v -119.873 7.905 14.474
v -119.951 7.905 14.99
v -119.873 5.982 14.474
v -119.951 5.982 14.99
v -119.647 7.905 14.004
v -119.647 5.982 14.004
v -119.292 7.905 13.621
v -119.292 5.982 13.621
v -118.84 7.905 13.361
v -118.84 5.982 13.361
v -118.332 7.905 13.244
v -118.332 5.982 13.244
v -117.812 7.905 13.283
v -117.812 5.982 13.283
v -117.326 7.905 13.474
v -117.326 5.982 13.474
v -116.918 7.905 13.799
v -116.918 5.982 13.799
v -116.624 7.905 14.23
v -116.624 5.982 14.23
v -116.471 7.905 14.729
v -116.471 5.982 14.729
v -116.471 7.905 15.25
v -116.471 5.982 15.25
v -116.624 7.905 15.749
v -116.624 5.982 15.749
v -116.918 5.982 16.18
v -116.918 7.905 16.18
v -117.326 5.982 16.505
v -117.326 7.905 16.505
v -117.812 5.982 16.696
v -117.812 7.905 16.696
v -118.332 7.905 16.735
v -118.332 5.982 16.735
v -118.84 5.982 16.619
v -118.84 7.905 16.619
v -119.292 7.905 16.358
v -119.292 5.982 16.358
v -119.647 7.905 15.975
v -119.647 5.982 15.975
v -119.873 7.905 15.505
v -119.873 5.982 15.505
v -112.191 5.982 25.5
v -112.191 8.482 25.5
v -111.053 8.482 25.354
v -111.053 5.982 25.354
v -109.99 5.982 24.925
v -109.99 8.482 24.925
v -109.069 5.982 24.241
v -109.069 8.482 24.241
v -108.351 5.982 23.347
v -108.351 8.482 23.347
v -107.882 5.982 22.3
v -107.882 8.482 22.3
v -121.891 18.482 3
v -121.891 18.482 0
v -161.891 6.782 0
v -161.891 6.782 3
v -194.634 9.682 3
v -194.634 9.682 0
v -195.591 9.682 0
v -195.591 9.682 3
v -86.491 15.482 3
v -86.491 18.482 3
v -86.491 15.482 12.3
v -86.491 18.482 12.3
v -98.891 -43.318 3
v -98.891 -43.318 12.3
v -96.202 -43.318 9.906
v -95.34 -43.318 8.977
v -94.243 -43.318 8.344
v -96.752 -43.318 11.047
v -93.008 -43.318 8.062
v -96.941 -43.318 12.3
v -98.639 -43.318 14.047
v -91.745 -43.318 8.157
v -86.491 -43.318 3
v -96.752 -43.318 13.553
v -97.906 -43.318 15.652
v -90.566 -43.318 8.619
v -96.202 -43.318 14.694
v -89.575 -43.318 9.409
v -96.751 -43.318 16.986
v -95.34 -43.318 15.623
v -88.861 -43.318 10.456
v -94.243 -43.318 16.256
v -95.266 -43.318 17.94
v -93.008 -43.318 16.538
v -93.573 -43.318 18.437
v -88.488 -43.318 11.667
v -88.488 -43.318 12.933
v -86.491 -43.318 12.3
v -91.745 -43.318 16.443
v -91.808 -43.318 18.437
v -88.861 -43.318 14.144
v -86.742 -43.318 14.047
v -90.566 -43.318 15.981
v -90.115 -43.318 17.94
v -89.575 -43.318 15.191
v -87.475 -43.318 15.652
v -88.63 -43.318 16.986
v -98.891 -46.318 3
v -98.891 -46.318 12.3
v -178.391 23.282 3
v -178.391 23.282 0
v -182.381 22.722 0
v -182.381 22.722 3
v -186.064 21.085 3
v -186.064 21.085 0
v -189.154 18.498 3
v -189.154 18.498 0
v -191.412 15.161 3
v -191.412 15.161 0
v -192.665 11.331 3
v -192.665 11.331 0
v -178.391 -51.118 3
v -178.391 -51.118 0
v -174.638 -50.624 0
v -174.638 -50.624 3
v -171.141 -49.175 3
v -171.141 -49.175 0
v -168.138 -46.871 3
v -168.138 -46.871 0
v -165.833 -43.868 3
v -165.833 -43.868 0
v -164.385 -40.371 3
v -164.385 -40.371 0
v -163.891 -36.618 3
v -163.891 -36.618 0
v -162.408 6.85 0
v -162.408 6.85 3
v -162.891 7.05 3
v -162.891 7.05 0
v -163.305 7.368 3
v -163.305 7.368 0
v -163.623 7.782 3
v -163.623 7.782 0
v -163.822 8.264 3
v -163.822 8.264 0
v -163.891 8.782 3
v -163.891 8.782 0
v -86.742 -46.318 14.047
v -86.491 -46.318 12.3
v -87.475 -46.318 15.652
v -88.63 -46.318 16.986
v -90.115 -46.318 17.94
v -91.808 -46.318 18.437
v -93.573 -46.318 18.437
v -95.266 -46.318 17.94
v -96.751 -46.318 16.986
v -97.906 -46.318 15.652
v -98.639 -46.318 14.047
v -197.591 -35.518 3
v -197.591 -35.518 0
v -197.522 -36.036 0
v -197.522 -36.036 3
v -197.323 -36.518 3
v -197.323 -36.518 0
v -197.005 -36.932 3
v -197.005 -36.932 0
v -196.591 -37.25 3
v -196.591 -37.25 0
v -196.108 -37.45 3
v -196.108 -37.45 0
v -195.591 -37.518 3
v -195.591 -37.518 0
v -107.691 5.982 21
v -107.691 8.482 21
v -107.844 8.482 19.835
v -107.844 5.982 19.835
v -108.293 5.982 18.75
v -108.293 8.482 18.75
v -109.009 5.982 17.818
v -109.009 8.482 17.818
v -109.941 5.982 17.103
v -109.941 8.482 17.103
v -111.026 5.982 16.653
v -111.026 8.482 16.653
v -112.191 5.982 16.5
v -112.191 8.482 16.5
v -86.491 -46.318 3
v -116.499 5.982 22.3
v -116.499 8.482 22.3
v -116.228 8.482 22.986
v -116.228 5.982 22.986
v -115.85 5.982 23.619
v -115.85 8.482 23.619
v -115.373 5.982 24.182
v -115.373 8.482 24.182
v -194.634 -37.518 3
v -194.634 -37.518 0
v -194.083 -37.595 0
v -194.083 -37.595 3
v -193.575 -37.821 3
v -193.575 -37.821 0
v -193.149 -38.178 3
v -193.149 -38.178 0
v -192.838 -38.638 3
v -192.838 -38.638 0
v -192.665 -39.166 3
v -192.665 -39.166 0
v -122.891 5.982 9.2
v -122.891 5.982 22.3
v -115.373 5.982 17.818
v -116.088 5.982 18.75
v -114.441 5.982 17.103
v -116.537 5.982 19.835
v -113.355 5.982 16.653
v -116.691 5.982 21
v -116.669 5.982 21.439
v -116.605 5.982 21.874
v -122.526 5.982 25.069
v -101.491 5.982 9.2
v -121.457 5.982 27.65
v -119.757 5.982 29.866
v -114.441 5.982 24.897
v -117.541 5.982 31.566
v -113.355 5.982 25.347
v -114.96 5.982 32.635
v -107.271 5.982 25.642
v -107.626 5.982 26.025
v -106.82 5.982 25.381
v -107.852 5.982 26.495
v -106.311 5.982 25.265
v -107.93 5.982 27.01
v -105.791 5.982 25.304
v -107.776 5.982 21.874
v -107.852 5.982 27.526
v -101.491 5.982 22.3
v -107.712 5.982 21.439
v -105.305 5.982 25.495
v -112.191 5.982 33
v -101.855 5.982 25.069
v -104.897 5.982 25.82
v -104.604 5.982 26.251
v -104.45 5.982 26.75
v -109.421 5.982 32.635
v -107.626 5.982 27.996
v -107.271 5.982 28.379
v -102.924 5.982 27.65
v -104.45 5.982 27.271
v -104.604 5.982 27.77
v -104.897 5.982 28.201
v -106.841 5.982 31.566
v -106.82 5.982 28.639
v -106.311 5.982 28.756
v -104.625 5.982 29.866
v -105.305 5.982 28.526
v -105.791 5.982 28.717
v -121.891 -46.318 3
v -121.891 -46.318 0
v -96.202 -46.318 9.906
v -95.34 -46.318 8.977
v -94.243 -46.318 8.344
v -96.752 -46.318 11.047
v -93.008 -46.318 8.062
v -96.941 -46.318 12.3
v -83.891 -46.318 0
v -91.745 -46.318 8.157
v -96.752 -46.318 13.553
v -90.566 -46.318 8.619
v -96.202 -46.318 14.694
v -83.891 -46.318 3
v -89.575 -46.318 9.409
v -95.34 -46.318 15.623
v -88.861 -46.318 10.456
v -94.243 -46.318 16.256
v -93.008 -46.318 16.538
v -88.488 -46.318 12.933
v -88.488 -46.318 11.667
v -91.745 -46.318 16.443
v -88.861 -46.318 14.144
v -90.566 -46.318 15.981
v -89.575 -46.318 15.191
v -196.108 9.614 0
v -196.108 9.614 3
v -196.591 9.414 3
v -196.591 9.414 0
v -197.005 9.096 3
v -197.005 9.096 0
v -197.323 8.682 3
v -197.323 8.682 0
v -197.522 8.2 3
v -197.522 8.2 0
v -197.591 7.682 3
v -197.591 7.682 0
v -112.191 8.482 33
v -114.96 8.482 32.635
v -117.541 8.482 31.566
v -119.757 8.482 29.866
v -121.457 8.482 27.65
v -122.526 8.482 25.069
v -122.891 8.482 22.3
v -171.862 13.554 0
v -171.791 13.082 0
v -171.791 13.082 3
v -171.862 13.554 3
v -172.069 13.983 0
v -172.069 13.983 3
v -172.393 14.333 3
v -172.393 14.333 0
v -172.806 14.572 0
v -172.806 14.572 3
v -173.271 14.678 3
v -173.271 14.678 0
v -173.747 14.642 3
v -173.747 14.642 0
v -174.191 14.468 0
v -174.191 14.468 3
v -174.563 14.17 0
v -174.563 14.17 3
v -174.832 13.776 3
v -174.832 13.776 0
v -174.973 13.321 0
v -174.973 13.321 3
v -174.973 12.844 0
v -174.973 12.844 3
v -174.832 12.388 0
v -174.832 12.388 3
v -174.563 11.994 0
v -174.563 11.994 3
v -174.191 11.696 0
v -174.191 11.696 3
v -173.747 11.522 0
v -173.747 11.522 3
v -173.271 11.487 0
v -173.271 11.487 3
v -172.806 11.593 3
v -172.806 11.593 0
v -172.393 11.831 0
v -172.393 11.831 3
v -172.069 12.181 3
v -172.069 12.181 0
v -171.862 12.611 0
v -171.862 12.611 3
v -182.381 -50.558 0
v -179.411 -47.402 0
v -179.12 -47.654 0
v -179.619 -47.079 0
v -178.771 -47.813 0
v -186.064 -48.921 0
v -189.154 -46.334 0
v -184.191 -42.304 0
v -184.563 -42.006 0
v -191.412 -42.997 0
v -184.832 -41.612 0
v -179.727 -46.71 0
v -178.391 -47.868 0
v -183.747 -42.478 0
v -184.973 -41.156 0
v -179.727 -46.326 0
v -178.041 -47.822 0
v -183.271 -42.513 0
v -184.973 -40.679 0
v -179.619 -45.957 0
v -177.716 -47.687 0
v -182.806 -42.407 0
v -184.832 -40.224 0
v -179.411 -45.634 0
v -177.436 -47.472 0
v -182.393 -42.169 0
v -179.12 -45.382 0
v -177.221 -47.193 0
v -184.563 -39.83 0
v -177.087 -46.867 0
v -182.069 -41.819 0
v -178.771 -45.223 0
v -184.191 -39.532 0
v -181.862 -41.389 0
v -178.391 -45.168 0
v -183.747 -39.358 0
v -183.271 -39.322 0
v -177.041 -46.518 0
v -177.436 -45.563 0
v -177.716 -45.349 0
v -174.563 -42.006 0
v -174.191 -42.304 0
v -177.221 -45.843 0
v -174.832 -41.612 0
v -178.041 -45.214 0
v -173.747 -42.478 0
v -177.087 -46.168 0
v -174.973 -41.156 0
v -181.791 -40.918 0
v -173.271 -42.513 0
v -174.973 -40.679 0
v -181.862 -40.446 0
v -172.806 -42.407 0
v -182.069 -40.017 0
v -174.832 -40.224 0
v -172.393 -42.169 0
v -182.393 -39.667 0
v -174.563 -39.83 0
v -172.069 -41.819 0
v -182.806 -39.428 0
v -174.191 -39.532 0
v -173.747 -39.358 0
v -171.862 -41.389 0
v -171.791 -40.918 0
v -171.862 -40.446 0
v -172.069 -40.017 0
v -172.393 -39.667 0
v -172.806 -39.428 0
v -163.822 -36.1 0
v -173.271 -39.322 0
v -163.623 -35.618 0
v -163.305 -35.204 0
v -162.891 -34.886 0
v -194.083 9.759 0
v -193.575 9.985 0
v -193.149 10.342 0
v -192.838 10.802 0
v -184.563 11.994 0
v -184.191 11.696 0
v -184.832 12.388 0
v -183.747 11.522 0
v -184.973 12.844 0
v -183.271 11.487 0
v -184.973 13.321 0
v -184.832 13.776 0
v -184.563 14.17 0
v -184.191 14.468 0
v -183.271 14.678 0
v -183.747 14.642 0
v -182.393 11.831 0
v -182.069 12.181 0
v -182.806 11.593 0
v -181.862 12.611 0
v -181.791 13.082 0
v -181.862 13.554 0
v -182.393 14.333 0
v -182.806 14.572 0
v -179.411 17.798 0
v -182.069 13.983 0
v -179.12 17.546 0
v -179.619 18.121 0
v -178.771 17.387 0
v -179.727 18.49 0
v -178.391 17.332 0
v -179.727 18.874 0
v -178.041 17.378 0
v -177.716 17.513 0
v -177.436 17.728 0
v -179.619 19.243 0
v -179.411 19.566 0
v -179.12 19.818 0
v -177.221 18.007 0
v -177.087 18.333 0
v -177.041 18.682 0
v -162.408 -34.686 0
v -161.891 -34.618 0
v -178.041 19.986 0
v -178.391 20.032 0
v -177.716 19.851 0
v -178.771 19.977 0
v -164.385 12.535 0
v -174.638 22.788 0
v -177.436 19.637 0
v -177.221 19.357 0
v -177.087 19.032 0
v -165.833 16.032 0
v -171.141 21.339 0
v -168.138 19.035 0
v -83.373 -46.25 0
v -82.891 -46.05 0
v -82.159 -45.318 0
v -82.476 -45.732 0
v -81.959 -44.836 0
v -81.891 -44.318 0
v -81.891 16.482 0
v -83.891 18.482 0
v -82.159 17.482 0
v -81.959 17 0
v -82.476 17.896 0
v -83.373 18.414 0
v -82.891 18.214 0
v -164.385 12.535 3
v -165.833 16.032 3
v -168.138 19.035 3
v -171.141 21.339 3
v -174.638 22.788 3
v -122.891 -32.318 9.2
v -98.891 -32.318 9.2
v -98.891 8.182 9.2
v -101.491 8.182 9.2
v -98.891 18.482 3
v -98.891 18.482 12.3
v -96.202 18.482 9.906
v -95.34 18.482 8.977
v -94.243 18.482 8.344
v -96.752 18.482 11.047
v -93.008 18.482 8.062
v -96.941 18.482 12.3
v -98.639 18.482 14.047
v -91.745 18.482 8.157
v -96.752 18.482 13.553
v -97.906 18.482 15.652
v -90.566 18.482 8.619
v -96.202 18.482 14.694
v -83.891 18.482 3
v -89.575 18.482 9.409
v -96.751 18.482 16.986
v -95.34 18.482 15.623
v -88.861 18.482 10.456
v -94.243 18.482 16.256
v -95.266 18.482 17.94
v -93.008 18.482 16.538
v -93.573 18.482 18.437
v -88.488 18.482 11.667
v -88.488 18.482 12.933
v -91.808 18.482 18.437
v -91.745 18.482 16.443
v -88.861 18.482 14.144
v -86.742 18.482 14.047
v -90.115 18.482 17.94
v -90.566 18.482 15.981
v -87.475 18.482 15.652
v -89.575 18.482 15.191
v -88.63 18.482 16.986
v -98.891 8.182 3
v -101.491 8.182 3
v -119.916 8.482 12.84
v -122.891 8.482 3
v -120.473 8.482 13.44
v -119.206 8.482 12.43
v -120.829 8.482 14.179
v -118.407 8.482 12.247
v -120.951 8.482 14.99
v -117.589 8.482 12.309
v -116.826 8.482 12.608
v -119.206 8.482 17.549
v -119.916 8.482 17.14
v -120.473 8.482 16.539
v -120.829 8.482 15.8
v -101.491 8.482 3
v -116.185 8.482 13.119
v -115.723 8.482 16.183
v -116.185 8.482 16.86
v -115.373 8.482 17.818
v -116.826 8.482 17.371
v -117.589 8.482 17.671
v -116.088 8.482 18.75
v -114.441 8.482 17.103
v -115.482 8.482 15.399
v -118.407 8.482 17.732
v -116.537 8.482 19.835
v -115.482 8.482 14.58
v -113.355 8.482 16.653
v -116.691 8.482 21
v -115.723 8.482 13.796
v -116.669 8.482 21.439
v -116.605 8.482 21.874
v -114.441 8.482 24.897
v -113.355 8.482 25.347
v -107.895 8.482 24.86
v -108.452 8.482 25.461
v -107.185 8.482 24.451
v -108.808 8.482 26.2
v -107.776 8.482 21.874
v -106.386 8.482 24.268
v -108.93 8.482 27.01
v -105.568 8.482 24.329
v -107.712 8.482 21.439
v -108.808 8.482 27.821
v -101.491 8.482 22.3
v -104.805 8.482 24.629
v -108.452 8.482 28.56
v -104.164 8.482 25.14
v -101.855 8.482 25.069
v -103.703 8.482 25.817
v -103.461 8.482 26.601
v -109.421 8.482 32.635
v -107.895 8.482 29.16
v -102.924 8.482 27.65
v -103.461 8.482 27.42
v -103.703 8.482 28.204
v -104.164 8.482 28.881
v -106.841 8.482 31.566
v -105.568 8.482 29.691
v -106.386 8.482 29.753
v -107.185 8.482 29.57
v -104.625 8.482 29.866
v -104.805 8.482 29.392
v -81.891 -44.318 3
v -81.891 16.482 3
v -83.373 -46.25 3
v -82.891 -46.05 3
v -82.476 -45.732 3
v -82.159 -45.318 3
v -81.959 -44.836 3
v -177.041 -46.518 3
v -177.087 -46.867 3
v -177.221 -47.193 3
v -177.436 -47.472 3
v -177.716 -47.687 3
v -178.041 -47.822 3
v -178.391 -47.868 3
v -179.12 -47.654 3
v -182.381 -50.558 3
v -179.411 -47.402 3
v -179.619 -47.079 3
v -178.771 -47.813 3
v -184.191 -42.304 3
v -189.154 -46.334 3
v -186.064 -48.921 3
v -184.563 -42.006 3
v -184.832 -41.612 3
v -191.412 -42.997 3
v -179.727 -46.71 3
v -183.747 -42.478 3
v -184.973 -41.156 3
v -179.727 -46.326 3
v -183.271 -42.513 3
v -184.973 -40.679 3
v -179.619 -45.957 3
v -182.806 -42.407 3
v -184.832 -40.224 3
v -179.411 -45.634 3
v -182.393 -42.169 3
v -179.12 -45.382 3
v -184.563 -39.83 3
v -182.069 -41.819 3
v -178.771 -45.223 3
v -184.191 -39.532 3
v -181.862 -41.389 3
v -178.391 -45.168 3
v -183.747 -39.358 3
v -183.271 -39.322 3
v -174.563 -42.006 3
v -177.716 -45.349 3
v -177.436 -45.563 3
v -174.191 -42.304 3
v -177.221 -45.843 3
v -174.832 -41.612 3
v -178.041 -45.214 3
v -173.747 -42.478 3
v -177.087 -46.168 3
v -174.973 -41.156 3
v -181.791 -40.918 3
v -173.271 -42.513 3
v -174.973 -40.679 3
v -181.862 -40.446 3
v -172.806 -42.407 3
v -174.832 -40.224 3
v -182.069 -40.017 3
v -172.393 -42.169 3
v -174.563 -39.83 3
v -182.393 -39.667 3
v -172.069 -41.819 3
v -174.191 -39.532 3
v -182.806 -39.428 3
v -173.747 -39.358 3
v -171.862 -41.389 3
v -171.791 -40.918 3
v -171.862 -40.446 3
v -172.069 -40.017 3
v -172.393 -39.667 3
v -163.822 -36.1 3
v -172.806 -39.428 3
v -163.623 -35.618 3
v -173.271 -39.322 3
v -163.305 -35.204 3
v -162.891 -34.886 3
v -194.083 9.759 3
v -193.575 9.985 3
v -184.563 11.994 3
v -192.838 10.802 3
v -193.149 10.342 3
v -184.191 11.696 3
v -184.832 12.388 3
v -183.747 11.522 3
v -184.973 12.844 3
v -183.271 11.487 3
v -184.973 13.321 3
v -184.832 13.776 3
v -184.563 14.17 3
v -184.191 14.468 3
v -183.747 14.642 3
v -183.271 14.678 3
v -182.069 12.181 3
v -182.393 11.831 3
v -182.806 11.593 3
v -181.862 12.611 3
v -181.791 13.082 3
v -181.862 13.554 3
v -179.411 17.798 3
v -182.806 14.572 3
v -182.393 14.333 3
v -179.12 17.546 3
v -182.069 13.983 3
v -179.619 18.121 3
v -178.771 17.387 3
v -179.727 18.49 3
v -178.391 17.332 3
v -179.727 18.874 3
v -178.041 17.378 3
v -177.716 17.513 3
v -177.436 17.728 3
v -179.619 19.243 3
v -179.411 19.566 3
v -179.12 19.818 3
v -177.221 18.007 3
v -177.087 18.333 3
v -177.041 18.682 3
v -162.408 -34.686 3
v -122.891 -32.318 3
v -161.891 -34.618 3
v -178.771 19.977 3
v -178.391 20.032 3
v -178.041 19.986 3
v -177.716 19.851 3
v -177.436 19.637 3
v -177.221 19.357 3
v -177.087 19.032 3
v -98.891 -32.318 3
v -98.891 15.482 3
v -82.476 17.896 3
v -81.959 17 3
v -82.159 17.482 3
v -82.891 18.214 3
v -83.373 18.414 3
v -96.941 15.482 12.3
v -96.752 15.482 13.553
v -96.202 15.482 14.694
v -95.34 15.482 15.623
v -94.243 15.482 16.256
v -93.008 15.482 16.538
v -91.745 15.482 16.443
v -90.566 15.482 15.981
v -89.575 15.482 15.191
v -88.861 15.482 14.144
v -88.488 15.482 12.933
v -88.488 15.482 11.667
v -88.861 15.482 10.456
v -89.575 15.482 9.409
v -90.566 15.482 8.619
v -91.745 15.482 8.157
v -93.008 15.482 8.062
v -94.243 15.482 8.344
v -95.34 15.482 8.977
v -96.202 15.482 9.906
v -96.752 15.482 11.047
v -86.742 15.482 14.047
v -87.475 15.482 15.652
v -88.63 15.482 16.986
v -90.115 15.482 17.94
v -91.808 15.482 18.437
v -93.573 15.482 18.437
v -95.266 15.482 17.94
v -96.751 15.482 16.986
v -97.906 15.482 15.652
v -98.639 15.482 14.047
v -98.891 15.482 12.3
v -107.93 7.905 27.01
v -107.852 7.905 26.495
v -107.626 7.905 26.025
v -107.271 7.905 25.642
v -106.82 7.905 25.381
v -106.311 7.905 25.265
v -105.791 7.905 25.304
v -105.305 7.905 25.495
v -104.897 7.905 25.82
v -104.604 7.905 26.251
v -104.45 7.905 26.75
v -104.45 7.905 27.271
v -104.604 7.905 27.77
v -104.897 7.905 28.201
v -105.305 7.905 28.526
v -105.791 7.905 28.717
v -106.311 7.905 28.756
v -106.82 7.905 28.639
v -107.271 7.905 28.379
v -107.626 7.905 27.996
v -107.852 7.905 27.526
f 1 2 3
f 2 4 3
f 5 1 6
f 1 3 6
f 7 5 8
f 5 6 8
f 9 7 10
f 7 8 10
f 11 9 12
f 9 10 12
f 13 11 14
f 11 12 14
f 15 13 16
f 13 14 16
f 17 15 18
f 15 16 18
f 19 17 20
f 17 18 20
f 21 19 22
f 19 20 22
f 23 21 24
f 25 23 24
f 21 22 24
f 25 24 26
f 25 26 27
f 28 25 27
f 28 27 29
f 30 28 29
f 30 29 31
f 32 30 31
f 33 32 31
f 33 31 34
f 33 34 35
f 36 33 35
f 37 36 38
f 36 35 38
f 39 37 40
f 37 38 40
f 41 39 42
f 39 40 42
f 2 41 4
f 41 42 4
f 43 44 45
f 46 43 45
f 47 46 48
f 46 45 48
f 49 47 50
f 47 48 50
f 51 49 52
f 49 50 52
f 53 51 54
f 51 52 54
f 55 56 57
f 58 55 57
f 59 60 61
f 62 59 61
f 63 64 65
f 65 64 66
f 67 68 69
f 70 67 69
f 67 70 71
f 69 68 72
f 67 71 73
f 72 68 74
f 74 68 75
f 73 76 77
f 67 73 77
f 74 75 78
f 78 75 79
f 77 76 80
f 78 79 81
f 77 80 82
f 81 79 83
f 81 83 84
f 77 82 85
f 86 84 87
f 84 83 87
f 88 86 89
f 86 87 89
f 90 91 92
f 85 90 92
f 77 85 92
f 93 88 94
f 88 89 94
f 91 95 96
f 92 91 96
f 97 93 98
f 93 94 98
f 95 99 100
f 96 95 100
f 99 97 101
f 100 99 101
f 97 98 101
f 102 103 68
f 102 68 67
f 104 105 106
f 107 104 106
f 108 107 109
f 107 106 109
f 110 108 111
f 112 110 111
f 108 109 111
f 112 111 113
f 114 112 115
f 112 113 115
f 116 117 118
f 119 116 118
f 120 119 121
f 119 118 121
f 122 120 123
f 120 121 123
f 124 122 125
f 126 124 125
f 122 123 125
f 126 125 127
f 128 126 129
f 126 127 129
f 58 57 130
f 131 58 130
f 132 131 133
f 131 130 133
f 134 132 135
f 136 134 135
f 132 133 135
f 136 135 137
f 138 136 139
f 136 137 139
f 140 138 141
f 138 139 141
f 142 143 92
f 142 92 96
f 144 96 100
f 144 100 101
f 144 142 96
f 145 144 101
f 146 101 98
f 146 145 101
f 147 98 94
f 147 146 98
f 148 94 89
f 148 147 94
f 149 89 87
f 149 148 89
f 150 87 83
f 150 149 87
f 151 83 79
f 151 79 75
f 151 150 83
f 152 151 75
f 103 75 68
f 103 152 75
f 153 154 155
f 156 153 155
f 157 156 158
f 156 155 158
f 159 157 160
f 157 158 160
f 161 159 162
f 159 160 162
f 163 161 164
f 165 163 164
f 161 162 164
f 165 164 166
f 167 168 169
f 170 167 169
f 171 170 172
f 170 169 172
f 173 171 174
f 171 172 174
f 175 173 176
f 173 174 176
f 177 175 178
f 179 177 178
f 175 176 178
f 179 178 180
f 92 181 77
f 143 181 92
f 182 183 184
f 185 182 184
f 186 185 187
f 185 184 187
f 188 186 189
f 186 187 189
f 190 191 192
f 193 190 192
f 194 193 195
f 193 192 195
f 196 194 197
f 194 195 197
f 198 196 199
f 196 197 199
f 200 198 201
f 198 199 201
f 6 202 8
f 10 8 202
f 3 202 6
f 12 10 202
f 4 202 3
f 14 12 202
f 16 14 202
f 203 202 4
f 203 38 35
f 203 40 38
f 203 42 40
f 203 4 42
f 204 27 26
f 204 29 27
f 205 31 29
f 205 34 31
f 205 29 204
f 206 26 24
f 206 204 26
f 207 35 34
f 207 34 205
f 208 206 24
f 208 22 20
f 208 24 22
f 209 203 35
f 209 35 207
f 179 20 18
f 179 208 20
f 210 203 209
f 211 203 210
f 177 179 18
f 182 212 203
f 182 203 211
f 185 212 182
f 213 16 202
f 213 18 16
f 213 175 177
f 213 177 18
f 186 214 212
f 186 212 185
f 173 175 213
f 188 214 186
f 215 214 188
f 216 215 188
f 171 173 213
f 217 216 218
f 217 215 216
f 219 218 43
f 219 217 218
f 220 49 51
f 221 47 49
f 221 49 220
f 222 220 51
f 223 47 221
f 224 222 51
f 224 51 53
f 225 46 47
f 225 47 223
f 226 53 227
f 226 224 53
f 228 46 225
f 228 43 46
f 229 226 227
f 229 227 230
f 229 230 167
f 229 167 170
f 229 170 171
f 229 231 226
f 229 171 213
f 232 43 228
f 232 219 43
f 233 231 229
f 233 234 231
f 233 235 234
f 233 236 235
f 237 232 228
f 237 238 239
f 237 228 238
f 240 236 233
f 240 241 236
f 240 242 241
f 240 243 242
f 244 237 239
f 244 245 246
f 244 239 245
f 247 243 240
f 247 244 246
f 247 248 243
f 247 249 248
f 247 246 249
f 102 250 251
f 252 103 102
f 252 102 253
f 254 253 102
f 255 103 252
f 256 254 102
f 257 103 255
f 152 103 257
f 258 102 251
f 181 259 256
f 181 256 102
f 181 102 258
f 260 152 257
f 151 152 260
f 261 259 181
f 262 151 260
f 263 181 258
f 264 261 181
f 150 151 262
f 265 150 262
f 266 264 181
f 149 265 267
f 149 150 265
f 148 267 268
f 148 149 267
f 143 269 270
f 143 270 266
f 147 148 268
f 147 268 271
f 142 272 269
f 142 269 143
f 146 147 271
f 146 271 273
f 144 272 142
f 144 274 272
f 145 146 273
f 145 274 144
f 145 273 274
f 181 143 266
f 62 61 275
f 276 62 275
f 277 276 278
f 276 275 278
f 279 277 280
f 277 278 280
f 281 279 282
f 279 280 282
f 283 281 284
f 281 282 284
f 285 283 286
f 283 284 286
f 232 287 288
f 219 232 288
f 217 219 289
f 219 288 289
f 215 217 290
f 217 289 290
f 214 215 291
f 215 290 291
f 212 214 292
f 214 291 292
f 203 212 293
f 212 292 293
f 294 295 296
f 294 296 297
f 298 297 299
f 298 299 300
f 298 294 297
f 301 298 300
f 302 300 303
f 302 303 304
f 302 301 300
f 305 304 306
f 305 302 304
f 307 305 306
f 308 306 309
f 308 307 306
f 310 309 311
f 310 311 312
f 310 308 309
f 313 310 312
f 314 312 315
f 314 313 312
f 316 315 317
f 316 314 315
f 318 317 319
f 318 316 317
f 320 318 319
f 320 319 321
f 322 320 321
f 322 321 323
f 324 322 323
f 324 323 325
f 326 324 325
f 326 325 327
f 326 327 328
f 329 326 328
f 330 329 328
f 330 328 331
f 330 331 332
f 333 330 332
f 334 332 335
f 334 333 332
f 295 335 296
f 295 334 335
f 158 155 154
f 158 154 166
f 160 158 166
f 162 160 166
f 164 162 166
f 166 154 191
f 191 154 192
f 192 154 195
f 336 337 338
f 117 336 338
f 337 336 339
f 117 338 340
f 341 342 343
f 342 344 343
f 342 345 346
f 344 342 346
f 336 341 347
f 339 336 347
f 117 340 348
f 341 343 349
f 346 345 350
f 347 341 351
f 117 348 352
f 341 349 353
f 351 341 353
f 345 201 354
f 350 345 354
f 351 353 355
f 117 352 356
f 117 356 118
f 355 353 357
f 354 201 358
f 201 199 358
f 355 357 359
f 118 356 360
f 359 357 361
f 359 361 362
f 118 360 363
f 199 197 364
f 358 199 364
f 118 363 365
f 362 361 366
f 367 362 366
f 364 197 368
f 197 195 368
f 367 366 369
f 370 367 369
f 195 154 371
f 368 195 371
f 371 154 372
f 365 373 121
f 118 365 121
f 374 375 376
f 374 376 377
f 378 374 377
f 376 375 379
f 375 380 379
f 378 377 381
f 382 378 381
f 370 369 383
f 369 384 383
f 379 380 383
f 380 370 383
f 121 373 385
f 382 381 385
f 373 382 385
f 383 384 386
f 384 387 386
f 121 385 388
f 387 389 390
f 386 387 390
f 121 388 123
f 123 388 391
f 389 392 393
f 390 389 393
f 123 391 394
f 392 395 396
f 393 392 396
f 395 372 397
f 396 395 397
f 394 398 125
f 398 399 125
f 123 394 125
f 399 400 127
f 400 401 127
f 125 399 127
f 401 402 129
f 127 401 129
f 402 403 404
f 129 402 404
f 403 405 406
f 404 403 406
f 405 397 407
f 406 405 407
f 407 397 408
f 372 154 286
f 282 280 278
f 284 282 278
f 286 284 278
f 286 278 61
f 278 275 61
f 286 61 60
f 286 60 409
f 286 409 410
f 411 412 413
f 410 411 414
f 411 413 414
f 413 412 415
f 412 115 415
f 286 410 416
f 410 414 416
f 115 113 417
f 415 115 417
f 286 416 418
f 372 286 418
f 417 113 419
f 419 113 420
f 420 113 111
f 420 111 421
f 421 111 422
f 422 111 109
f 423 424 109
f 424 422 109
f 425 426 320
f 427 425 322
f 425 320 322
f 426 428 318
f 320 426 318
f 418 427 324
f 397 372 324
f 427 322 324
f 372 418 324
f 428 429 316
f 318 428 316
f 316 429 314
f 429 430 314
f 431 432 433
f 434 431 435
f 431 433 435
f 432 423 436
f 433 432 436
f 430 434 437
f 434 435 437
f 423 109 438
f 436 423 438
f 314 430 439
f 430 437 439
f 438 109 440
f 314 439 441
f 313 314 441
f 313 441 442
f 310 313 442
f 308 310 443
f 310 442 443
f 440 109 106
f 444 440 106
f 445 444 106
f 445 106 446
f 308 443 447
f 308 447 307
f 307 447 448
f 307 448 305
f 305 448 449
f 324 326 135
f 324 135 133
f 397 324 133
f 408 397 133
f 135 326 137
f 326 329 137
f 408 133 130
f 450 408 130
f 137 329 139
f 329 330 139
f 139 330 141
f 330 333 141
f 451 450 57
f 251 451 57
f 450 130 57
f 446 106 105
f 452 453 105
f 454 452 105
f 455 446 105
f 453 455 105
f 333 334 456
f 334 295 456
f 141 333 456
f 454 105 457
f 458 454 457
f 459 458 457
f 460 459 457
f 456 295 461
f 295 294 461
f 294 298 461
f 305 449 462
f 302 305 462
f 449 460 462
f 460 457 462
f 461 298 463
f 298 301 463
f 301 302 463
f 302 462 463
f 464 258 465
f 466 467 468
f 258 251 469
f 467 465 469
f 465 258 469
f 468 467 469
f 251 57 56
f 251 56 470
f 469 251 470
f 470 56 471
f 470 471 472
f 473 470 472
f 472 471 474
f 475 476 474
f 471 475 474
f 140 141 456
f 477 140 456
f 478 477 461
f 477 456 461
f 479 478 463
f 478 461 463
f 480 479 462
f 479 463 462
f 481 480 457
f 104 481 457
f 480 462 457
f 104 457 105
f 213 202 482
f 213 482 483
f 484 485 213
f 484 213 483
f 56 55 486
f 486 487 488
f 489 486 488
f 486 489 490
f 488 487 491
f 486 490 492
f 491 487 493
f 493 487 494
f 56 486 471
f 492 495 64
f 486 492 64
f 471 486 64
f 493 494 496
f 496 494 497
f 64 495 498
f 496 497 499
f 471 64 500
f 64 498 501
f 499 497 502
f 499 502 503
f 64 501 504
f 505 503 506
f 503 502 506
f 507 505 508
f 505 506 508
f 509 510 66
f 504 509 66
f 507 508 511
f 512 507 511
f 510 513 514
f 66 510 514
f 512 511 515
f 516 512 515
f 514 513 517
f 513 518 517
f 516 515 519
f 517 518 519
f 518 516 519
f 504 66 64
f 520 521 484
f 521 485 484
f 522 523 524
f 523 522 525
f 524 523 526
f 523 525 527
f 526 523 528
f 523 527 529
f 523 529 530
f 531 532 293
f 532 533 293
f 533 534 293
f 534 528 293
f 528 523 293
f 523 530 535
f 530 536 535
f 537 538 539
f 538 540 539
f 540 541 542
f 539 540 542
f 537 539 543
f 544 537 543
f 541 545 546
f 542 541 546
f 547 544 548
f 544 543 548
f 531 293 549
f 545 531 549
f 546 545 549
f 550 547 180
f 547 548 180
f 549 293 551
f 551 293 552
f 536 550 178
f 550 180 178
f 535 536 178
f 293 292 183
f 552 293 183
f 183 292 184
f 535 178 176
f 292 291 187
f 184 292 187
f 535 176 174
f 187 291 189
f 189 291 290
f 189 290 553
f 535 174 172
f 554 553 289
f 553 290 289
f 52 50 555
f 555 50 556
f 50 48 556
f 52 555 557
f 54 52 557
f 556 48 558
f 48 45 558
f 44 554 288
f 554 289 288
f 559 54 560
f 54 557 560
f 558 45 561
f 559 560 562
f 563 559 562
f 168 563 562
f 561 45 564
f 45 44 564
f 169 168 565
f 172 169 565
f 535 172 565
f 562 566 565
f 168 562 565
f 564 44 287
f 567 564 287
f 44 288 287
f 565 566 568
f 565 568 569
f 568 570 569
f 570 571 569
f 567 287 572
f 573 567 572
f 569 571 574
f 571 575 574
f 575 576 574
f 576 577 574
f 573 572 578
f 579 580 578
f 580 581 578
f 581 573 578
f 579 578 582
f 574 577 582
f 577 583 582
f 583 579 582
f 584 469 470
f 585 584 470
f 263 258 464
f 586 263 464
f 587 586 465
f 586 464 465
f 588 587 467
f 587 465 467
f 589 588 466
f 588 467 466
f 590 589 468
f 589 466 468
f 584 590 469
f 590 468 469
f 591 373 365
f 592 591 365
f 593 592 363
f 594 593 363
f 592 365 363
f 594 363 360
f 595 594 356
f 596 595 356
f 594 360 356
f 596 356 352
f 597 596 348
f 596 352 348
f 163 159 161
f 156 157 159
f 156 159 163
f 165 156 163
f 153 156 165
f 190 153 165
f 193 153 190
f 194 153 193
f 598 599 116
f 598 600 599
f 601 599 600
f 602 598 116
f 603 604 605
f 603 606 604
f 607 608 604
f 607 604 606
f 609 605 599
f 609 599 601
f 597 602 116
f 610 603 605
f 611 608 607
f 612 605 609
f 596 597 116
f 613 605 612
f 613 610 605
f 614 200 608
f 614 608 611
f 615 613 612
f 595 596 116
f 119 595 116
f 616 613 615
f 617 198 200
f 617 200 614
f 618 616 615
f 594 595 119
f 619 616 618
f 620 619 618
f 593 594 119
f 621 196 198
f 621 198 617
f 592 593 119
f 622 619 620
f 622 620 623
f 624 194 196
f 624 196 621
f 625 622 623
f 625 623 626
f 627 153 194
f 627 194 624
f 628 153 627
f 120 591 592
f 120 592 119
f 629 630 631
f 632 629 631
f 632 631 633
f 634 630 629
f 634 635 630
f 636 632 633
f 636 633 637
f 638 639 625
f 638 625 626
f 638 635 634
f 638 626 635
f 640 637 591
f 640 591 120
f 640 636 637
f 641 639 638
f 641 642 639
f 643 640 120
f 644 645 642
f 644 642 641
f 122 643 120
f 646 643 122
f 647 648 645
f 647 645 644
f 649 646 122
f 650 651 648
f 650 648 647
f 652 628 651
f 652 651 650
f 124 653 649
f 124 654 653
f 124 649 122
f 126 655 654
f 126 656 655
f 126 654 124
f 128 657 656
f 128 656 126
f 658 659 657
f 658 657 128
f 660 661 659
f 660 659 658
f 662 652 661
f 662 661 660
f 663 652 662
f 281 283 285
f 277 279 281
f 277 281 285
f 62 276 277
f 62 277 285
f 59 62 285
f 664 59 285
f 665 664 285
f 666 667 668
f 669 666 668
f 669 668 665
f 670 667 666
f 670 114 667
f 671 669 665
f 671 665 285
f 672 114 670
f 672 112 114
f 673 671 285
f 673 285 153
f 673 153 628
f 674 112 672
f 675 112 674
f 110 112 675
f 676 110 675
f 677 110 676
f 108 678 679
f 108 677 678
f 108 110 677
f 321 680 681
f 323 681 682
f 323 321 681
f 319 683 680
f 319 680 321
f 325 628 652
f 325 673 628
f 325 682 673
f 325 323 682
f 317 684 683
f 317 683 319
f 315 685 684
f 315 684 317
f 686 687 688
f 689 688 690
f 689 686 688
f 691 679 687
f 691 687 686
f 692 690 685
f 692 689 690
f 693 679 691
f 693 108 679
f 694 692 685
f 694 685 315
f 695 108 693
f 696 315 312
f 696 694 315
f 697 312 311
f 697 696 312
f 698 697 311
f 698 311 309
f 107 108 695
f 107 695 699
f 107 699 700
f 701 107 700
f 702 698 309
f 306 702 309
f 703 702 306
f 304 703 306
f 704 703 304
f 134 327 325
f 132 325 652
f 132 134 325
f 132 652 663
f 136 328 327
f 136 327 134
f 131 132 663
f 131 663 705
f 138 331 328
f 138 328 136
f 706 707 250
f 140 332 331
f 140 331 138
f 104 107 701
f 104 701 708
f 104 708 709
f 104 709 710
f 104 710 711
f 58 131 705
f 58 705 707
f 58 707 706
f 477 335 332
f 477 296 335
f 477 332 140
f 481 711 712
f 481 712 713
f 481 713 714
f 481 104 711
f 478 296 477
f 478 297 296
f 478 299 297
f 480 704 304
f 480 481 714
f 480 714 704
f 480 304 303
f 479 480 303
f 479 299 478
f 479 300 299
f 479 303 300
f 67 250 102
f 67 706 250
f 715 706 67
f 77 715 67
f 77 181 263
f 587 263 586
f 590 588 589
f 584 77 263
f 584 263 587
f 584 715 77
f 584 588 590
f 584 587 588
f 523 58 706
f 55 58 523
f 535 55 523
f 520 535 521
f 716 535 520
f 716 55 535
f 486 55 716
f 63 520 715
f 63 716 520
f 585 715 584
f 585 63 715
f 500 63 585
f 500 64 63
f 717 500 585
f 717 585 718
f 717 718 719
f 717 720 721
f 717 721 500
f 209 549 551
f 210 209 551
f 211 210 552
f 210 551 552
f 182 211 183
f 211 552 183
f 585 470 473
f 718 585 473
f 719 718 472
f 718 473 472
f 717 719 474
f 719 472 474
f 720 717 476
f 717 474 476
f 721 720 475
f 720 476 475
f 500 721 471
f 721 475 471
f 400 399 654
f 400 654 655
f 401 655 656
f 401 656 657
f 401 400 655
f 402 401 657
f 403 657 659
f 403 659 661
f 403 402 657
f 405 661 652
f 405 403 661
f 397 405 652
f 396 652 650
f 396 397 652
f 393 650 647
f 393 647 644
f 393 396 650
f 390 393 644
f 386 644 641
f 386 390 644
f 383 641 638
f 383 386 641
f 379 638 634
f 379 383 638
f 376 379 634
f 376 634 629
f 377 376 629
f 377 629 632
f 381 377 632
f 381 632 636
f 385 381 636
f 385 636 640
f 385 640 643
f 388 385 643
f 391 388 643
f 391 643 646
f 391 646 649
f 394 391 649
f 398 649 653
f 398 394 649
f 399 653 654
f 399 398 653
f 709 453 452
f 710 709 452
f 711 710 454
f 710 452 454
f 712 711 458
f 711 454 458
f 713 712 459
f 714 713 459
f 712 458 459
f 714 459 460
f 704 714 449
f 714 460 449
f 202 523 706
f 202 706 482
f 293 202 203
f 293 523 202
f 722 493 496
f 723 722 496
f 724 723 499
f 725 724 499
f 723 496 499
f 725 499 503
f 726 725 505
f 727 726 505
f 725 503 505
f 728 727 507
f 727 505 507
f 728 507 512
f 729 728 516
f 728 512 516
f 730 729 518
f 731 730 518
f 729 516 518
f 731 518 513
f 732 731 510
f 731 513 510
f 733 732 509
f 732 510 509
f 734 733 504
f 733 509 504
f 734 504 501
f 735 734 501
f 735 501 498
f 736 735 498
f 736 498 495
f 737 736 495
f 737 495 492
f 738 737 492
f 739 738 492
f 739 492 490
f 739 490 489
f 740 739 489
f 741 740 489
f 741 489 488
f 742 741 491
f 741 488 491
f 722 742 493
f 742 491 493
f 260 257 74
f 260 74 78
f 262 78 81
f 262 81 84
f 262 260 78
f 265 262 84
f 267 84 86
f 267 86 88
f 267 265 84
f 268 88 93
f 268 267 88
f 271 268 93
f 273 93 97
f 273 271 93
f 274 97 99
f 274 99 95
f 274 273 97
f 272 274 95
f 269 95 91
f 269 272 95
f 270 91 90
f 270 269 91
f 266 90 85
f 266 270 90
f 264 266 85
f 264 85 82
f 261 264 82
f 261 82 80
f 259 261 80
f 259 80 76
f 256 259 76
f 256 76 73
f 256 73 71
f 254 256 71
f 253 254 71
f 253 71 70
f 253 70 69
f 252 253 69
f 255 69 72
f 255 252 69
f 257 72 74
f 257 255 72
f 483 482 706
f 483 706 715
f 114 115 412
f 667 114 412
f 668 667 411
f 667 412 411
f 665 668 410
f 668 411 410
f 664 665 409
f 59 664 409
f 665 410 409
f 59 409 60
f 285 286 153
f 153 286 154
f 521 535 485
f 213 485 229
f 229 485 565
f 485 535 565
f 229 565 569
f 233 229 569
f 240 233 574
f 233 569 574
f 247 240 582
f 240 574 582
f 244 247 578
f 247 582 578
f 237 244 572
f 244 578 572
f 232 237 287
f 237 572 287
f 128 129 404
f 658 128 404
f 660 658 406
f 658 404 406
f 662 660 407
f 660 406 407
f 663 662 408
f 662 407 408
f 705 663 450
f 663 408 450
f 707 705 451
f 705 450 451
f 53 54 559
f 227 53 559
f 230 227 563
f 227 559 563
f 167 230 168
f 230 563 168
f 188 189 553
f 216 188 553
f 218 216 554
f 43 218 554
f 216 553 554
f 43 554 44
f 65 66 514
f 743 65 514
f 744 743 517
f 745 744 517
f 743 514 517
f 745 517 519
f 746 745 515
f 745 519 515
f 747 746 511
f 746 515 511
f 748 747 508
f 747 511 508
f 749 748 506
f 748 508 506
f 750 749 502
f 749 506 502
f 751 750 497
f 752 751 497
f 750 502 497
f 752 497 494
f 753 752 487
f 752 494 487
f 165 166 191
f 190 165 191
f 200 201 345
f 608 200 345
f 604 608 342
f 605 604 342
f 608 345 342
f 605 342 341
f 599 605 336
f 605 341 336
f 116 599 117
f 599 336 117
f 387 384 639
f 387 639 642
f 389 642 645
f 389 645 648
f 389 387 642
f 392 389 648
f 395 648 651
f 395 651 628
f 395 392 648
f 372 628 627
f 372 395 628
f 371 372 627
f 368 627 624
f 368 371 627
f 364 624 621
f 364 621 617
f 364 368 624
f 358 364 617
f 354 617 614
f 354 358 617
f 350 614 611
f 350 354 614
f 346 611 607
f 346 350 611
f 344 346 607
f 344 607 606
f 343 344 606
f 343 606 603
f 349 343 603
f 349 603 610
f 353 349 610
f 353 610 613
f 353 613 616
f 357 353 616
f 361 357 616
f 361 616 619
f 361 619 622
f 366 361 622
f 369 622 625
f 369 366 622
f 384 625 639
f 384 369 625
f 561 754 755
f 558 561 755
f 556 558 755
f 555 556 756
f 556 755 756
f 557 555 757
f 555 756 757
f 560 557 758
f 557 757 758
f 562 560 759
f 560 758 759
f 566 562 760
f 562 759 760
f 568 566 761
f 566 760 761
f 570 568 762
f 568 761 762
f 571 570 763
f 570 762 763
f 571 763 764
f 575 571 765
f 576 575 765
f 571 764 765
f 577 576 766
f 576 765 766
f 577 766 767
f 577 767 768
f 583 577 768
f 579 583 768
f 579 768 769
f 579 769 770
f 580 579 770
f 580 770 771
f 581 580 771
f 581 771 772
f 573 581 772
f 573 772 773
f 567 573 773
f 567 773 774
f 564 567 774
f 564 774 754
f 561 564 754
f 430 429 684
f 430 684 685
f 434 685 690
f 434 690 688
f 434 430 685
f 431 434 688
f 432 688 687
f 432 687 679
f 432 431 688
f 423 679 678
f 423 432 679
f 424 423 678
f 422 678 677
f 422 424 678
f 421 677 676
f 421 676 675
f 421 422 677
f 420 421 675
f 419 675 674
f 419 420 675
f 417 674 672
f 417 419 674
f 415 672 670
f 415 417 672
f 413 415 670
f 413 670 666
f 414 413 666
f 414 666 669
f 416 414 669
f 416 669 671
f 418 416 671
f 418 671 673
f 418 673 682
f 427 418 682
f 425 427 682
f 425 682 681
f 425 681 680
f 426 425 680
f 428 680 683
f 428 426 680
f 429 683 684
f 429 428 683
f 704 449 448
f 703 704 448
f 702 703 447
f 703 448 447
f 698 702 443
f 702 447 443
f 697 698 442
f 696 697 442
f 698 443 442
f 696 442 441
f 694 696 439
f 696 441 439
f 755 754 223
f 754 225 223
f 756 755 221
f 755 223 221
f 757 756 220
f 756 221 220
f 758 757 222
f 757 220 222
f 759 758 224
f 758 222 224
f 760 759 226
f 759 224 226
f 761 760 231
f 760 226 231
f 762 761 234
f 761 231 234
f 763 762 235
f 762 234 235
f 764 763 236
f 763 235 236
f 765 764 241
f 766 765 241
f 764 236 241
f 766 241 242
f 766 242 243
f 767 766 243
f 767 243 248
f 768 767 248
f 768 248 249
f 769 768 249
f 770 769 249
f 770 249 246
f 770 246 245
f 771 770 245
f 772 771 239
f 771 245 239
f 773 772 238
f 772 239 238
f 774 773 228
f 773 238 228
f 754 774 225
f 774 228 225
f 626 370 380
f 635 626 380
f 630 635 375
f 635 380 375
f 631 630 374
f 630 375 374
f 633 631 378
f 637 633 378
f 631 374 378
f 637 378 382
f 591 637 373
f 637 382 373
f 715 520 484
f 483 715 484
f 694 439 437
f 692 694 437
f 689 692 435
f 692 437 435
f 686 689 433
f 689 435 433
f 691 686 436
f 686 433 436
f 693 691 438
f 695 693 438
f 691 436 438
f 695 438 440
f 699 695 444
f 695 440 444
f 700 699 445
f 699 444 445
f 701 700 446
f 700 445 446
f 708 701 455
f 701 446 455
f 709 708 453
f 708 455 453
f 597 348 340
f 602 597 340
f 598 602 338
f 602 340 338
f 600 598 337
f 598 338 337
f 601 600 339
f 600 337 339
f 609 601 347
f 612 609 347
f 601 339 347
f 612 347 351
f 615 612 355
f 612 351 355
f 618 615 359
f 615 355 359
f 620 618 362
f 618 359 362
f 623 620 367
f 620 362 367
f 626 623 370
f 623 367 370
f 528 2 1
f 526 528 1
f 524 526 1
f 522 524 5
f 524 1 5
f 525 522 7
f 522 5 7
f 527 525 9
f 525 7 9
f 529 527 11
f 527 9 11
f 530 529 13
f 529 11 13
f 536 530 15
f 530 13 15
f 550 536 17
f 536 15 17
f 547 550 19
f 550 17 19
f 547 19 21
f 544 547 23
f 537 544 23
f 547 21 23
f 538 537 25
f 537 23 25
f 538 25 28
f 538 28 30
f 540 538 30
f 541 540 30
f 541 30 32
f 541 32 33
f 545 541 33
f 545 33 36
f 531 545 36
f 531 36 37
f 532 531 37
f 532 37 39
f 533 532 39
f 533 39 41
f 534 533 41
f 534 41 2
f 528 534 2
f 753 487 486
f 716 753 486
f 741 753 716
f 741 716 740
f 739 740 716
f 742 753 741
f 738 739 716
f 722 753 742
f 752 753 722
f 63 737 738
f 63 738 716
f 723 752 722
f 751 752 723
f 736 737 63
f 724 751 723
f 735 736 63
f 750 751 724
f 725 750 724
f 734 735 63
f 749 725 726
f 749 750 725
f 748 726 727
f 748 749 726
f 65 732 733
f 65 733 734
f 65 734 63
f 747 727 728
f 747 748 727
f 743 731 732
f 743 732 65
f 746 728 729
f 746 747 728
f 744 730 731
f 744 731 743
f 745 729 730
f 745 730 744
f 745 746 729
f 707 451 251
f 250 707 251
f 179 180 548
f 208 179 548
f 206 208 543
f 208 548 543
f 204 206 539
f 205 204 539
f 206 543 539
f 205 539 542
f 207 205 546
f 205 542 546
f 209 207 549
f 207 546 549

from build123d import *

# Parameters (mm, degrees)
F0_R            = 1.6
F0_W            = 20
F0_H            = 32.4
F1_DEPTH        = 3
F7_DEPTH        = 3
F9_DEPTH        = 3
F11_DEPTH       = 2.5
F12_D           = 3.5
F12_CSINK_D     = 5.5
F12_CSINK_ANGLE = 120
F14_W           = 24
F14_H           = 9.2
F15_DEPTH       = 15.5
F16_DEPTH       = 25


with BuildPart() as f1:
    # F0 (on Top) → F1 (new body)
    with BuildSketch(Plane.XY):
        with BuildLine():
            Line((-197.590603765, 7.6821263526), (-197.590603765, -13.9178736474))
            Line((-197.590603765, -13.9178736474), (-178.390603765, -13.9178736474))
            Line((-178.390603765, -13.9178736474), (-178.390603765, 8.7821263526))
            Line((-178.390603765, 8.7821263526), (-178.390603765, 17.3321263526))
            ThreePointArc((-178.390603765, 17.3321263526), (-179.740603765, 18.6821263526), (-178.390603765, 20.0321263526))
            Line((-178.390603765, 20.0321263526), (-178.390603765, 23.2821263526))
            ThreePointArc((-178.390603765, 23.2821263526), (-187.699120556, 19.8997481824), (-192.6648892104, 11.3306112011))
            ThreePointArc((-192.6648892104, 11.3306112011), (-193.3498228179, 10.1486612726), (-194.6337561684, 9.6821263526))
            Line((-194.6337561684, 9.6821263526), (-195.590603765, 9.6821263526))
            ThreePointArc((-195.590603765, 9.6821263526), (-197.0048173273, 9.096339915), (-197.590603765, 7.6821263526))
        make_face()
        with Locations((-183.390603765, 13.0821263526)):
            Circle(F0_R, mode=Mode.SUBTRACT)
        with BuildLine():
            Line((-178.390603765, -13.9178736474), (-197.590603765, -13.9178736474))
            Line((-197.590603765, -13.9178736474), (-197.590603765, -35.5178736474))
            ThreePointArc((-197.590603765, -35.5178736474), (-197.0048173273, -36.9320872098), (-195.590603765, -37.5178736474))
            Line((-195.590603765, -37.5178736474), (-194.6337561684, -37.5178736474))
            ThreePointArc((-194.6337561684, -37.5178736474), (-193.3498228179, -37.9844085674), (-192.6648892104, -39.1663584959))
            ThreePointArc((-192.6648892104, -39.1663584959), (-187.699120556, -47.7354954773), (-178.390603765, -51.1178736474))
            Line((-178.390603765, -51.1178736474), (-178.390603765, -47.8678736474))
            ThreePointArc((-178.390603765, -47.8678736474), (-179.740603765, -46.5178736474), (-178.390603765, -45.1678736474))
            Line((-178.390603765, -45.1678736474), (-178.390603765, -13.9178736474))
        make_face()
        with Locations((-183.390603765, -40.9178736474)):
            Circle(F0_R, mode=Mode.SUBTRACT)
        with BuildLine():
            Line((-178.390603765, 8.7821263526), (-178.390603765, -13.9178736474))
            Line((-178.390603765, -13.9178736474), (-161.890603765, -13.9178736474))
            Line((-161.890603765, -13.9178736474), (-161.890603765, 6.7821263526))
            ThreePointArc((-161.890603765, 6.7821263526), (-163.3048173273, 7.3679127902), (-163.890603765, 8.7821263526))
            Line((-163.890603765, 8.7821263526), (-178.390603765, 8.7821263526))
        make_face()
        with BuildLine():
            Line((-161.890603765, -13.9178736474), (-178.390603765, -13.9178736474))
            Line((-178.390603765, -13.9178736474), (-178.390603765, -45.1678736474))
            ThreePointArc((-178.390603765, -45.1678736474), (-177.4360096104, -45.5632794928), (-177.040603765, -46.5178736474))
            ThreePointArc((-177.040603765, -46.5178736474), (-177.4360096104, -47.472467802), (-178.390603765, -47.8678736474))
            Line((-178.390603765, -47.8678736474), (-178.390603765, -51.1178736474))
            ThreePointArc((-178.390603765, -51.1178736474), (-168.1375554378, -46.8709219746), (-163.890603765, -36.6178736474))
            ThreePointArc((-163.890603765, -36.6178736474), (-163.3048173273, -35.203660085), (-161.890603765, -34.6178736474))
            Line((-161.890603765, -34.6178736474), (-161.890603765, -13.9178736474))
        make_face()
        with Locations((-173.390603765, -40.9178736474)):
            Circle(F0_R, mode=Mode.SUBTRACT)
        Polygon((-161.890603765, 6.7821263526), (-161.890603765, -13.9178736474), (-121.890603765, -13.9178736474), (-121.890603765, 18.4821263526), align=None)
        Polygon((-121.890603765, -13.9178736474), (-161.890603765, -13.9178736474), (-161.890603765, -34.6178736474), (-121.890603765, -46.3178736474), align=None)
        with BuildLine():
            Line((-178.390603765, 17.3321263526), (-178.390603765, 8.7821263526))
            Line((-178.390603765, 8.7821263526), (-163.890603765, 8.7821263526))
            ThreePointArc((-163.890603765, 8.7821263526), (-168.1375554378, 19.0351746798), (-178.390603765, 23.2821263526))
            Line((-178.390603765, 23.2821263526), (-178.390603765, 20.0321263526))
            ThreePointArc((-178.390603765, 20.0321263526), (-177.4360096104, 19.6367205072), (-177.040603765, 18.6821263526))
            ThreePointArc((-177.040603765, 18.6821263526), (-177.4360096104, 17.727532198), (-178.390603765, 17.3321263526))
        make_face()
        with Locations((-173.390603765, 13.0821263526)):
            Circle(F0_R, mode=Mode.SUBTRACT)
        with Locations((-111.890603765, 2.2821263526)):
            Rectangle(F0_W, F0_H)
        with Locations((-111.890603765, -30.1178736474)):
            Rectangle(F0_W, F0_H)
        with BuildLine():
            Line((-101.890603765, 18.4821263526), (-101.890603765, -13.9178736474))
            Line((-101.890603765, -13.9178736474), (-81.890603765, -13.9178736474))
            Line((-81.890603765, -13.9178736474), (-81.890603765, -5.8178736474))
            Line((-81.890603765, -5.8178736474), (-81.890603765, 16.4821263526))
            ThreePointArc((-81.890603765, 16.4821263526), (-82.4763902026, 17.896339915), (-83.890603765, 18.4821263526))
            Line((-83.890603765, 18.4821263526), (-101.890603765, 18.4821263526))
        make_face()
        with BuildLine():
            Line((-81.890603765, -13.9178736474), (-101.890603765, -13.9178736474))
            Line((-101.890603765, -13.9178736474), (-101.890603765, -46.3178736474))
            Line((-101.890603765, -46.3178736474), (-83.890603765, -46.3178736474))
            ThreePointArc((-83.890603765, -46.3178736474), (-82.4763902026, -45.7320872098), (-81.890603765, -44.3178736474))
            Line((-81.890603765, -44.3178736474), (-81.890603765, -22.0178736474))
            Line((-81.890603765, -22.0178736474), (-81.890603765, -13.9178736474))
        make_face()
    extrude(amount=F1_DEPTH)

    # F6 (on plane+point) → F7 (join)
    with BuildSketch(Plane.XZ.offset(46.3178736474)):
        with BuildLine():
            Line((-98.890603765, 12.3), (-98.890603765, 0))
            Line((-98.890603765, 0), (-86.490603765, 0))
            Line((-86.490603765, 0), (-86.490603765, 12.3))
            Line((-86.490603765, 12.3), (-88.440603765, 12.3))
            ThreePointArc((-88.440603765, 12.3), (-92.690603765, 8.05), (-96.940603765, 12.3))
            Line((-96.940603765, 12.3), (-98.890603765, 12.3))
        make_face()
        with BuildLine():
            ThreePointArc((-86.490603765, 12.3), (-92.690603765, 18.5), (-98.890603765, 12.3))
            Line((-98.890603765, 12.3), (-96.940603765, 12.3))
            ThreePointArc((-96.940603765, 12.3), (-92.690603765, 16.55), (-88.440603765, 12.3))
            Line((-88.440603765, 12.3), (-86.490603765, 12.3))
        make_face()
    extrude(amount=-F7_DEPTH)

    # F8 (on plane+point) → F9 (join)
    with BuildSketch(Plane.XZ.offset(-18.4821263526)):
        with BuildLine():
            Line((-98.890603765, 12.3), (-98.890603765, 0))
            Line((-98.890603765, 0), (-86.490603765, 0))
            Line((-86.490603765, 0), (-86.490603765, 12.3))
            Line((-86.490603765, 12.3), (-88.440603765, 12.3))
            ThreePointArc((-88.440603765, 12.3), (-92.690603765, 8.05), (-96.940603765, 12.3))
            Line((-96.940603765, 12.3), (-98.890603765, 12.3))
        make_face()
        with BuildLine():
            ThreePointArc((-86.490603765, 12.3), (-92.690603765, 18.5), (-98.890603765, 12.3))
            Line((-98.890603765, 12.3), (-96.940603765, 12.3))
            ThreePointArc((-96.940603765, 12.3), (-92.690603765, 16.55), (-88.440603765, 12.3))
            Line((-88.440603765, 12.3), (-86.490603765, 12.3))
        make_face()
    extrude(amount=F9_DEPTH)

    # F10 (on plane+point) → F11 (join)
    with BuildSketch(Plane.XZ.offset(-8.4821263526)):
        with BuildLine():
            Line((-122.890603765, 22.3), (-122.890603765, 0))
            Line((-122.890603765, 0), (-101.490603765, 0))
            Line((-101.490603765, 0), (-101.490603765, 22.3))
            Line((-101.490603765, 22.3), (-107.8824719192, 22.3))
            ThreePointArc((-107.8824719192, 22.3), (-107.738829214, 21.6570413588), (-107.690603765, 21))
            ThreePointArc((-107.690603765, 21), (-109.0086232496, 17.8180194847), (-112.190603765, 16.5))
            ThreePointArc((-112.190603765, 16.5), (-115.3725842803, 17.8180194847), (-116.690603765, 21))
            ThreePointArc((-116.690603765, 21), (-116.6423783159, 21.6570413588), (-116.4987356107, 22.3))
            Line((-116.4987356107, 22.3), (-122.890603765, 22.3))
        make_face()
        with BuildLine():
            ThreePointArc((-112.190603765, 33), (-119.7566463237, 29.8660425587), (-122.890603765, 22.3))
            Line((-122.890603765, 22.3), (-116.4987356107, 22.3))
            ThreePointArc((-116.4987356107, 22.3), (-116.0520683136, 23.3106474287), (-115.3725842803, 24.1819805153))
            ThreePointArc((-115.3725842803, 24.1819805153), (-113.9126792106, 25.1574578963), (-112.190603765, 25.5))
            Line((-112.190603765, 25.5), (-112.190603765, 33))
        make_face()
        with BuildLine():
            Line((-107.8824719192, 22.3), (-101.490603765, 22.3))
            ThreePointArc((-101.490603765, 22.3), (-104.6245612063, 29.8660425587), (-112.190603765, 33))
            Line((-112.190603765, 33), (-112.190603765, 25.5))
            ThreePointArc((-112.190603765, 25.5), (-109.507322192, 24.6124783736), (-107.8824719192, 22.3))
        make_face()
    extrude(amount=F11_DEPTH)

    # F12 (through all)
    with Locations(Plane(origin=(0, 8.4821263526, 0), x_dir=(1, 0, 0), z_dir=(0, 1, 0))):
        with Locations((-106.1801961249, -27.0104076401), (-118.201011405, -14.9895923599)):
            CounterSinkHole(F12_D / 2, F12_CSINK_D / 2, counter_sink_angle=F12_CSINK_ANGLE)

    # F14 (on plane+point) → F15 (join)
    with BuildSketch(Plane.XZ.offset(7.3178736474)):
        with Locations((-110.890603765, 4.6)):
            Rectangle(F14_W, F14_H)
    extrude(amount=-F15_DEPTH)

    # F14 (on plane+point) → F16 (join)
    with BuildSketch(Plane.XZ.offset(7.3178736474)):
        with Locations((-110.890603765, 4.6)):
            Rectangle(F14_W, F14_H)
    extrude(amount=F16_DEPTH)


solid = f1.part
